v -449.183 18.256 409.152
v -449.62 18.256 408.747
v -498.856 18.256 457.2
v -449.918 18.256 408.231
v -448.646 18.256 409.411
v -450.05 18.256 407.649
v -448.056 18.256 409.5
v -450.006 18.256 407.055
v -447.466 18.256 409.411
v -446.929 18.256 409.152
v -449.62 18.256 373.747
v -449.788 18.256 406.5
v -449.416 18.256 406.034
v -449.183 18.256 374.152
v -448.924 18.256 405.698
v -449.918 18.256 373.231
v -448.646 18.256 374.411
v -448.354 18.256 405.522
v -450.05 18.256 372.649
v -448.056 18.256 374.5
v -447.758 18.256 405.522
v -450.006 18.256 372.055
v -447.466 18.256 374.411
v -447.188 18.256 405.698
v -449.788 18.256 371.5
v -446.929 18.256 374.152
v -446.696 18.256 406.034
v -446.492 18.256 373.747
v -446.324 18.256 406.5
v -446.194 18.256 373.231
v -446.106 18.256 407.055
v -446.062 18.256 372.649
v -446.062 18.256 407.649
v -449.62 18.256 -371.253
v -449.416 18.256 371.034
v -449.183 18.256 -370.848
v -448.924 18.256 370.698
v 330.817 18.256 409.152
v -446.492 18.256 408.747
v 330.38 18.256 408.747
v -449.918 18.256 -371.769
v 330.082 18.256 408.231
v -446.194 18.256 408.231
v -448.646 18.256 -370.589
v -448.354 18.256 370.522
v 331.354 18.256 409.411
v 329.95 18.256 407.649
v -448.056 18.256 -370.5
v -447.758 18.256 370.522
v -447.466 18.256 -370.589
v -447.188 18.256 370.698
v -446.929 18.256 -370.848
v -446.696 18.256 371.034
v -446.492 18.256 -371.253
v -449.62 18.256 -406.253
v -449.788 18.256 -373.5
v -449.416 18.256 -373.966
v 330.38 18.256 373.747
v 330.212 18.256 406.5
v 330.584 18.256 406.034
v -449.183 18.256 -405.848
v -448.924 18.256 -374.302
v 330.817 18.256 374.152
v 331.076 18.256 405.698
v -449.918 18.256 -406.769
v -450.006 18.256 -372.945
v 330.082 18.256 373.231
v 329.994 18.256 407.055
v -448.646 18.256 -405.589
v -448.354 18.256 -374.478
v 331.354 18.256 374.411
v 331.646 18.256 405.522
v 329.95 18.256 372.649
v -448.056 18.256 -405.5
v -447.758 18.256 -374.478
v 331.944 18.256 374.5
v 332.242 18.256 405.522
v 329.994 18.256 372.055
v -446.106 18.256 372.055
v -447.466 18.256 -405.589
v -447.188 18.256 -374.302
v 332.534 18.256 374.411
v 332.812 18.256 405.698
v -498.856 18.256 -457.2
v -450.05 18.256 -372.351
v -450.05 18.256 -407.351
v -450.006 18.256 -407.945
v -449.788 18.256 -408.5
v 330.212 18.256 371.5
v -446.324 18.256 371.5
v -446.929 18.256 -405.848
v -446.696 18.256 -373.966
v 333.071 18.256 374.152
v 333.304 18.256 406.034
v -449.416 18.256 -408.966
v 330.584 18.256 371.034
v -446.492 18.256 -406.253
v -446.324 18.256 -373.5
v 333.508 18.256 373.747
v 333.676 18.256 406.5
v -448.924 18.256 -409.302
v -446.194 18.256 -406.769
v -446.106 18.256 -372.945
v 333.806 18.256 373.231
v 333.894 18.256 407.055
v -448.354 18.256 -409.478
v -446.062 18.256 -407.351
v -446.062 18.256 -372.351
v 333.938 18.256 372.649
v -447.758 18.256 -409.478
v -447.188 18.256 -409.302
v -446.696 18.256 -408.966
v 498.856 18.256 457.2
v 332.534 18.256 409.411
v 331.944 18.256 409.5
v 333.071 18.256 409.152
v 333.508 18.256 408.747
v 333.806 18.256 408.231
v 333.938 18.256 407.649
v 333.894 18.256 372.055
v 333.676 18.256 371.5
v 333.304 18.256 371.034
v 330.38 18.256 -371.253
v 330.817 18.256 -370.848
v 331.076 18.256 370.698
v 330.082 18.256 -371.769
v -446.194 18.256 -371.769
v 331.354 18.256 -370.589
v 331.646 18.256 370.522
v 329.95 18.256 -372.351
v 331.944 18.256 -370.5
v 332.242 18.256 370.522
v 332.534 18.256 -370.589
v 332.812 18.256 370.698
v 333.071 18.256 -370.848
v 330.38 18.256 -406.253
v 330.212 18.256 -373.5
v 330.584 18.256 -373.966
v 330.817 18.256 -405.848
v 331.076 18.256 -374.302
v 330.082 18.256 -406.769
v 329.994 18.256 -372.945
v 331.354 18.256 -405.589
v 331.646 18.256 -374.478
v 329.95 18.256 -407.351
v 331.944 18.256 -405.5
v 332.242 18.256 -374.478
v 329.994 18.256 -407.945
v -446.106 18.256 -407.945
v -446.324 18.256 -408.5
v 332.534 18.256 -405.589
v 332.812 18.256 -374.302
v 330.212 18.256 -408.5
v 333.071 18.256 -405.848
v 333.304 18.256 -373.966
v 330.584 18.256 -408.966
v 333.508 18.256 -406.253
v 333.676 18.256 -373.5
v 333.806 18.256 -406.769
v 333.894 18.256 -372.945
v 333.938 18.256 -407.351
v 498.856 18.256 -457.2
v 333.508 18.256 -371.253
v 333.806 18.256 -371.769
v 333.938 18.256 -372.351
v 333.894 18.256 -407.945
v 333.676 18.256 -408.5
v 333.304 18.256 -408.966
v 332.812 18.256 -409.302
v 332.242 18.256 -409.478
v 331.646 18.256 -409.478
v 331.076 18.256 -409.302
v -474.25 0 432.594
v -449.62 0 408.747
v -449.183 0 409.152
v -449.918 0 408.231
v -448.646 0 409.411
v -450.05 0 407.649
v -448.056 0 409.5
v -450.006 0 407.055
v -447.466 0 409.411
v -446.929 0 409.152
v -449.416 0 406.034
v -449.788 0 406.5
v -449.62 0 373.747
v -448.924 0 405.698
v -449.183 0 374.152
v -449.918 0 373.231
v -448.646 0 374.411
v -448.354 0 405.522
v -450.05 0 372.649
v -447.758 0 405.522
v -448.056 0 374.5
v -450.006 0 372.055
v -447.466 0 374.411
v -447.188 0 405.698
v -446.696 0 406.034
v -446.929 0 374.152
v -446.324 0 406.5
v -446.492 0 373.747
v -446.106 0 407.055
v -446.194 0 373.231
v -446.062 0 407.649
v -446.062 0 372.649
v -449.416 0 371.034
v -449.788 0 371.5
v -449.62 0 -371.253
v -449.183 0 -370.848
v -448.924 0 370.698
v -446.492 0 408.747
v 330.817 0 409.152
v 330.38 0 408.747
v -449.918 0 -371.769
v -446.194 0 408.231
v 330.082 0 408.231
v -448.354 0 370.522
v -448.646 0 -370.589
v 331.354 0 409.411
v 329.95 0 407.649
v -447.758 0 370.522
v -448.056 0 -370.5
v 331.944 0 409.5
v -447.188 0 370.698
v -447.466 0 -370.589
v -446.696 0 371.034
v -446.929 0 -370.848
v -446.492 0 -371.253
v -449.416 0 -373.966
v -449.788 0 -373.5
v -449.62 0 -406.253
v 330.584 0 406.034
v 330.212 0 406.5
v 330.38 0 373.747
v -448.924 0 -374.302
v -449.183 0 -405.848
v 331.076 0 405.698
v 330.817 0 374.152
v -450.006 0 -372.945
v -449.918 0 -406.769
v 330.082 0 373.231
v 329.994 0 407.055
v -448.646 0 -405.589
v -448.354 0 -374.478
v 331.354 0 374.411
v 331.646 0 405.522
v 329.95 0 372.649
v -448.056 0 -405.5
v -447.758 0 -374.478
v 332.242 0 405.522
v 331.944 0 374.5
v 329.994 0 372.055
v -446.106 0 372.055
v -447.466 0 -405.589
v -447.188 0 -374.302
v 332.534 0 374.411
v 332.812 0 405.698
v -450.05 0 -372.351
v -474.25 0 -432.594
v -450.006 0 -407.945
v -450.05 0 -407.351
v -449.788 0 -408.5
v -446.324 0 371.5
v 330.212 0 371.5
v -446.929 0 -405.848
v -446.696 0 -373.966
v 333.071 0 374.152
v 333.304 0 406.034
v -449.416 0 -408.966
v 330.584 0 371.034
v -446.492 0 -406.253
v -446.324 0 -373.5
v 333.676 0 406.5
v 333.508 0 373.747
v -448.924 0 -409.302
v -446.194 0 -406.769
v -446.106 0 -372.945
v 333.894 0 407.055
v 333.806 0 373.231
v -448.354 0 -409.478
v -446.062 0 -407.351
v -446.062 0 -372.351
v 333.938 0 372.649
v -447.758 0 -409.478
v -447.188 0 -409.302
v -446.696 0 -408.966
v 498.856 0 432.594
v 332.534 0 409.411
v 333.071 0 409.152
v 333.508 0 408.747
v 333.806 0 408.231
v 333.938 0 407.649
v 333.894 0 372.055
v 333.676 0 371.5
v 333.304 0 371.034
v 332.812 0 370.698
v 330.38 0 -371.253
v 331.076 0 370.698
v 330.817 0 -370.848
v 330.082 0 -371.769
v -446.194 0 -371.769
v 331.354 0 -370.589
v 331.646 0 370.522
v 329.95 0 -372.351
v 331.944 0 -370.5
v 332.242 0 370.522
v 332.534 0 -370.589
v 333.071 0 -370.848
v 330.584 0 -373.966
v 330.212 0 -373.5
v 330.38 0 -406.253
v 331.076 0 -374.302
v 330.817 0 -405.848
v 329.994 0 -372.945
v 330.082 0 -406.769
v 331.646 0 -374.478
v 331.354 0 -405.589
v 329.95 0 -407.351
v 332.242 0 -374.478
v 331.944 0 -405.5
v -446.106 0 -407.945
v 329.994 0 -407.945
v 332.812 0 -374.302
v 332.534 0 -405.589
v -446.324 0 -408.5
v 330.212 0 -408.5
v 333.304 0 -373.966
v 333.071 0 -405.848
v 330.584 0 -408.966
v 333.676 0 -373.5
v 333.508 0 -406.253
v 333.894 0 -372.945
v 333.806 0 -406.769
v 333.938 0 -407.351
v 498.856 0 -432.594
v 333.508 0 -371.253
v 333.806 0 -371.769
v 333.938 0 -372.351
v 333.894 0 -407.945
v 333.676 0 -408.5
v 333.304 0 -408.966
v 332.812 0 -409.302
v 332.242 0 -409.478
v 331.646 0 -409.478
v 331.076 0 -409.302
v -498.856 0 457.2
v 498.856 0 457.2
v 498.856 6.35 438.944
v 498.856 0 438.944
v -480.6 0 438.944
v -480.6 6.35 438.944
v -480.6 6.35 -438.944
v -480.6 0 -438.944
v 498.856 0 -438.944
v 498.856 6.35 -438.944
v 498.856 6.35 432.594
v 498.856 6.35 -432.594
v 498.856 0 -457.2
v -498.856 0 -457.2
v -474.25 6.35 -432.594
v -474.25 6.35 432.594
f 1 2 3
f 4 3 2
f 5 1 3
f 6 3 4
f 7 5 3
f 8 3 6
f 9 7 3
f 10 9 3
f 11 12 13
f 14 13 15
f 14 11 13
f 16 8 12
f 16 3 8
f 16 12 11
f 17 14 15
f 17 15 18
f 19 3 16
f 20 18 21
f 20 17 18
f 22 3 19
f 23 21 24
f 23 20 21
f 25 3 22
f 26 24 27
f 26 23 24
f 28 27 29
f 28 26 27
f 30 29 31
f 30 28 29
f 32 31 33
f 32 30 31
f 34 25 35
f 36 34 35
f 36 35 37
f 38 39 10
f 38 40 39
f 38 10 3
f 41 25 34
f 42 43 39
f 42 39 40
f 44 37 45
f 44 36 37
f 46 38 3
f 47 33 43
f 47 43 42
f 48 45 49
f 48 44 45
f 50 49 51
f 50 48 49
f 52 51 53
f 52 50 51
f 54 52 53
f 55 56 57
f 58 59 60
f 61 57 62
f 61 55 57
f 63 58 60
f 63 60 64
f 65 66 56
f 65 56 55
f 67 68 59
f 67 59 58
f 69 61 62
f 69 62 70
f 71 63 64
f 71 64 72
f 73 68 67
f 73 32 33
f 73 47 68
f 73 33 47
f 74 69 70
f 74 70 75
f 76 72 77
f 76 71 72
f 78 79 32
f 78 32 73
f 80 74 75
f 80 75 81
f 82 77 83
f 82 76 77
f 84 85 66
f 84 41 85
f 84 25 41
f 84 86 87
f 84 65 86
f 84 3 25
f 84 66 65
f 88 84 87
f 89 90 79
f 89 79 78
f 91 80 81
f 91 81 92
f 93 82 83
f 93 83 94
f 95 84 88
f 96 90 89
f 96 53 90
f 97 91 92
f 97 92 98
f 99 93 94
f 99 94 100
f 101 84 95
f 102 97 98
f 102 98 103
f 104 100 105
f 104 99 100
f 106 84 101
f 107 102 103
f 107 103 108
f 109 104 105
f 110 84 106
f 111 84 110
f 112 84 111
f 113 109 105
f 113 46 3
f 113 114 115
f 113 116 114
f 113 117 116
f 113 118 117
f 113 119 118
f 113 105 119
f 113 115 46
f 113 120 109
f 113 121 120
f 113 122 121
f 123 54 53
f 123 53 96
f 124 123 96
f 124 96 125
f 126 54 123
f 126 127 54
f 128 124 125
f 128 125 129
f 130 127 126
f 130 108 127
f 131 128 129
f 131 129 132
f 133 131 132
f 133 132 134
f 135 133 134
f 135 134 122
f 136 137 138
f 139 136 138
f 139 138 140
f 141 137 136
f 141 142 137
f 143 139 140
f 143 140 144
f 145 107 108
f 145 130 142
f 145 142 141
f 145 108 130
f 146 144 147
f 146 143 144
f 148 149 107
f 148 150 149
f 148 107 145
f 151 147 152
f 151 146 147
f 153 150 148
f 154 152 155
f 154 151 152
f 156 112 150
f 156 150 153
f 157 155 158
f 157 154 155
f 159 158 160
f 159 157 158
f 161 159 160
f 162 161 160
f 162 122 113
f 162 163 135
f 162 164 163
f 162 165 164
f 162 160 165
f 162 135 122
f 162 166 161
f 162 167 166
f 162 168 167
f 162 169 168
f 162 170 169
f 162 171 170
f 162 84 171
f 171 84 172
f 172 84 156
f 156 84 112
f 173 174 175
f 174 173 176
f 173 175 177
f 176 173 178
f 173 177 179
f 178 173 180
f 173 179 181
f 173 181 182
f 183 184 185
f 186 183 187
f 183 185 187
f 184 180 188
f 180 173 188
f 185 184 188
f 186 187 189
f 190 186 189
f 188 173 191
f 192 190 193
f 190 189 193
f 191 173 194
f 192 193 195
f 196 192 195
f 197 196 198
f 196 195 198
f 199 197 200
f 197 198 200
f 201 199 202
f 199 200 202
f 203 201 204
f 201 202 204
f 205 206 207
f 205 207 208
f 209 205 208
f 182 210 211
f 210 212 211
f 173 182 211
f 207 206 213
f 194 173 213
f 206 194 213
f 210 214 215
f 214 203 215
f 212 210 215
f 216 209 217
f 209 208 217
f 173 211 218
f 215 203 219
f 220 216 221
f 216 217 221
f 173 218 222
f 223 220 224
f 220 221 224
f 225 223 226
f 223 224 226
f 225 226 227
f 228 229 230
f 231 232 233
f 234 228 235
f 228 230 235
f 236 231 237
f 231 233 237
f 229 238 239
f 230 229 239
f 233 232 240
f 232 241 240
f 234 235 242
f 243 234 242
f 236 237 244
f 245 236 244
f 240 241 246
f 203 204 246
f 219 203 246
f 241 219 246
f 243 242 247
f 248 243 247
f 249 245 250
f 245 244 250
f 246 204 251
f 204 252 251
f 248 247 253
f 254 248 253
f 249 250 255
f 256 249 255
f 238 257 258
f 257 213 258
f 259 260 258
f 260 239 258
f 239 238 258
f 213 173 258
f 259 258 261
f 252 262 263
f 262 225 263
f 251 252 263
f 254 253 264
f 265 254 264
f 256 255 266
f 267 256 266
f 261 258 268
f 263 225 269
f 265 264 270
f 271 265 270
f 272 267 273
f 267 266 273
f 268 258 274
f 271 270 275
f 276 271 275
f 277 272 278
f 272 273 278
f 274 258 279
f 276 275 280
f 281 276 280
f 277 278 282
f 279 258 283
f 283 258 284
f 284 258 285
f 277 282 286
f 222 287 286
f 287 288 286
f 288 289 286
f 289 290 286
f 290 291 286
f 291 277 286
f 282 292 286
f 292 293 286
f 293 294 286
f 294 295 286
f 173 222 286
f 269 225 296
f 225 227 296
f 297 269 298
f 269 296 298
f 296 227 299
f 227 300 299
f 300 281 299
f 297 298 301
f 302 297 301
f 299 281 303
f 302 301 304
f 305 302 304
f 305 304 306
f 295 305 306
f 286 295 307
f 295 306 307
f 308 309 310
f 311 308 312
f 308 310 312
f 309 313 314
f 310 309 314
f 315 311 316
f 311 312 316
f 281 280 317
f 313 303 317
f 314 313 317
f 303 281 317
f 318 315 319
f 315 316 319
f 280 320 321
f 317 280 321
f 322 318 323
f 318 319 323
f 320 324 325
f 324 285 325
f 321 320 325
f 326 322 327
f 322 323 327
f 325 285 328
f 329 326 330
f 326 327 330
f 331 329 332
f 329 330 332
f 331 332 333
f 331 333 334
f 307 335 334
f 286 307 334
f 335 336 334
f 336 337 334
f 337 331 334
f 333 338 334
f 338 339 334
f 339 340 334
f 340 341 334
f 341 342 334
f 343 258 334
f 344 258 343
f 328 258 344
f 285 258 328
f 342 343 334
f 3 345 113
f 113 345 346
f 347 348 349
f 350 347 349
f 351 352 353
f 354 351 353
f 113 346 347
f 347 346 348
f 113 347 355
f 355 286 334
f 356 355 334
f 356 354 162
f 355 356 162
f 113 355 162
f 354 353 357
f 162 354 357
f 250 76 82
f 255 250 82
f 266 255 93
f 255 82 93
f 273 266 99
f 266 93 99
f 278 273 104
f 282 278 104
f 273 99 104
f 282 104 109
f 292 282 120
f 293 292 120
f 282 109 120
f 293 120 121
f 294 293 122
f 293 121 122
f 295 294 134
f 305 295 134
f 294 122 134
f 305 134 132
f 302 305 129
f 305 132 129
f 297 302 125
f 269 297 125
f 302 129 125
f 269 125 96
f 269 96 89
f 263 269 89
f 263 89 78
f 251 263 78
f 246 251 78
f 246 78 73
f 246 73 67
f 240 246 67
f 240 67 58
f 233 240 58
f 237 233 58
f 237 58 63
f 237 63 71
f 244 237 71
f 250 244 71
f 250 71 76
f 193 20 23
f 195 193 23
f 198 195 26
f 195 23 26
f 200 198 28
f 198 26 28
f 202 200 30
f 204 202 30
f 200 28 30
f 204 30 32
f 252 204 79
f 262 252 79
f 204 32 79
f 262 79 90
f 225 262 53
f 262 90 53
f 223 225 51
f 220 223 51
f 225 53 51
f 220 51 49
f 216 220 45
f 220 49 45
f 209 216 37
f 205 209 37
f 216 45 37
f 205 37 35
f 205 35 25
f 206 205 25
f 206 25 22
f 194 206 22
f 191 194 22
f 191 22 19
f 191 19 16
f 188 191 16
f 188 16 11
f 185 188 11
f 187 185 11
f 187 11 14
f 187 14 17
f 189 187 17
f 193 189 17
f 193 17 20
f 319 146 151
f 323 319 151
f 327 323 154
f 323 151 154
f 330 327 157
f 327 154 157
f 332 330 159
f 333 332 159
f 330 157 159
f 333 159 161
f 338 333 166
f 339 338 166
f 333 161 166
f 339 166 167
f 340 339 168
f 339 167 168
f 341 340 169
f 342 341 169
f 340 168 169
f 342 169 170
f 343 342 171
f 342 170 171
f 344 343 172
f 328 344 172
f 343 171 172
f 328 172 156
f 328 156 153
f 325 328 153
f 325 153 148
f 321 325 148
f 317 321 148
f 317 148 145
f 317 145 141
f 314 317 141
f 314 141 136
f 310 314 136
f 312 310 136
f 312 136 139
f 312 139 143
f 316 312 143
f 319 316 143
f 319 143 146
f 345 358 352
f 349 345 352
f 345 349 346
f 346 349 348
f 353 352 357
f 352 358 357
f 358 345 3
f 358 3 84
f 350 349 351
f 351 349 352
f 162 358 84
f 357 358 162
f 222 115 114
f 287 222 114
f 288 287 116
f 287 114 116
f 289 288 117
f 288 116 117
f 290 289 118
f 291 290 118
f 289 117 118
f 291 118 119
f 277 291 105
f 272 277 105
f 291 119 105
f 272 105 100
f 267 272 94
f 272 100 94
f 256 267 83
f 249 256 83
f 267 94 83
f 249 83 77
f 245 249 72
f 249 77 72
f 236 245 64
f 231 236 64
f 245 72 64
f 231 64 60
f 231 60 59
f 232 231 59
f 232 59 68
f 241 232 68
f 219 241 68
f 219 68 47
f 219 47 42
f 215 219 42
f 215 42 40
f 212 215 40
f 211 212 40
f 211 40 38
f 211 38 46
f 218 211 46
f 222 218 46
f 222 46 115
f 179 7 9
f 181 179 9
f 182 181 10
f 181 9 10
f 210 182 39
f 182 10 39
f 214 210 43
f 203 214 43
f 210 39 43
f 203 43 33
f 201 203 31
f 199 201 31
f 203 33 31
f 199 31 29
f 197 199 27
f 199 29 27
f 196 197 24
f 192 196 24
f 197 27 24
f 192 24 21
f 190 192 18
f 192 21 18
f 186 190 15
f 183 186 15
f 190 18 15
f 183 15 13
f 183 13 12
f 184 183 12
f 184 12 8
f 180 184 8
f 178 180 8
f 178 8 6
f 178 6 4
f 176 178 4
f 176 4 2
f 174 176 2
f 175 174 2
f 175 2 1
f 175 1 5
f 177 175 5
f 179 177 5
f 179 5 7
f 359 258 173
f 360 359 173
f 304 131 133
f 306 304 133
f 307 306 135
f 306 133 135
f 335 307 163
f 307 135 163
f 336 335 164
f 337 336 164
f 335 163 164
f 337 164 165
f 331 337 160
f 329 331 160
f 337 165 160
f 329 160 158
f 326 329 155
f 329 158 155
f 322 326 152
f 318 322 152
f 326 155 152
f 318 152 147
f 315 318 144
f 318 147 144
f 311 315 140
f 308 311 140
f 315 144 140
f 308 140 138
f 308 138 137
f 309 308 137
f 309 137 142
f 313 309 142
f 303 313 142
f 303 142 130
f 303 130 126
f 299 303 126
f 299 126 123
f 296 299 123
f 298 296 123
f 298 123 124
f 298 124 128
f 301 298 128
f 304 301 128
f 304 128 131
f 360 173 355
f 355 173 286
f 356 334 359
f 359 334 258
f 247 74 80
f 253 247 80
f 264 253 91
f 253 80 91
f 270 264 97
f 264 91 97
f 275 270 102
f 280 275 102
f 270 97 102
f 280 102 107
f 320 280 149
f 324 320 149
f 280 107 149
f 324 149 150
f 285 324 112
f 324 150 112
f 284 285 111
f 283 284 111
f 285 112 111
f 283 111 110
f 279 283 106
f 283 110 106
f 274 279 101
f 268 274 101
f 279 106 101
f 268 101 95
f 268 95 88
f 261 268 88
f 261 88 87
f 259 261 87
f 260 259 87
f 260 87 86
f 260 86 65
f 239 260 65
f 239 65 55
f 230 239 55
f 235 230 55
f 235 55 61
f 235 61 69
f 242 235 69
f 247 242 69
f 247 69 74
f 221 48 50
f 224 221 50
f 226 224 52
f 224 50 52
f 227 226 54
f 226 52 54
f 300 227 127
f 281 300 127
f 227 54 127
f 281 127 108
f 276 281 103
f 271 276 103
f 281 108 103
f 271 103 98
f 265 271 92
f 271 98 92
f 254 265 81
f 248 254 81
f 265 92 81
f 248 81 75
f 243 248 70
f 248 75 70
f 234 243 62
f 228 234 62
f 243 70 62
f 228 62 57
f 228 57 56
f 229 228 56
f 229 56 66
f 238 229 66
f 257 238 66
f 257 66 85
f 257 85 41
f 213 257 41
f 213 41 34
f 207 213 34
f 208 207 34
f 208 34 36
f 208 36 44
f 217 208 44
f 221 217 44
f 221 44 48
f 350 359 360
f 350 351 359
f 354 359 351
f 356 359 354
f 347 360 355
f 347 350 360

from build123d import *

# Parameters (mm, degrees)
SKETCH1_W           = 997.712
SKETCH1_H           = 914.4
BOSS_EXTRUDE1_DEPTH = 18.25625
SKETCH2_R           = 2
CUT_EXTRUDE1_DEPTH  = 50.8
CUT_EXTRUDE3_DEPTH  = 6.35


with BuildPart() as part:
    # Sketch1 → Boss-Extrude1 (new body)
    with BuildSketch(Plane(origin=(0, 0, 0), x_dir=(1, 0, 0), z_dir=(0, 1, 0))):
        Rectangle(SKETCH1_W, SKETCH1_H)
    extrude(amount=BOSS_EXTRUDE1_DEPTH)

    # Sketch2 → Cut-Extrude1 (cut)
    with BuildSketch(Plane(origin=(0, 18.25625, 0), x_dir=(1, 0, 0), z_dir=(0, 1, 0))):
        with Locations(Location((-448.056, 407.5, 0), (0, 0, 270))):
            Circle(SKETCH2_R)
        with Locations(Location((-448.056, 372.5, 0), (0, 0, 270))):
            Circle(SKETCH2_R)
        with Locations(Location((331.944, 372.5, 0), (0, 0, 270))):
            Circle(SKETCH2_R)
        with Locations(Location((331.944, 407.5, 0), (0, 0, 270))):
            Circle(SKETCH2_R)
        with Locations(Location((-448.056, -372.5, 0), (0, 0, 270))):
            Circle(SKETCH2_R)
        with Locations(Location((-448.056, -407.5, 0), (0, 0, 270))):
            Circle(SKETCH2_R)
        with Locations(Location((331.944, -372.5, 0), (0, 0, 270))):
            Circle(SKETCH2_R)
        with Locations(Location((331.944, -407.5, 0), (0, 0, 270))):
            Circle(SKETCH2_R)
    extrude(amount=-CUT_EXTRUDE1_DEPTH, mode=Mode.SUBTRACT)

    # Sketch4 → Cut-Extrude3 (cut)
    with BuildSketch(Plane.XZ):
        Polygon((-480.59975, -438.94375), (498.856, -438.94375), (498.856, -432.59375), (-474.24975, -432.59375), (-474.24975, 432.59375), (498.856, 432.59375), (498.856, 438.94375), (-480.59975, 438.94375), align=None)
    extrude(amount=-CUT_EXTRUDE3_DEPTH, mode=Mode.SUBTRACT)


solid = part.part
